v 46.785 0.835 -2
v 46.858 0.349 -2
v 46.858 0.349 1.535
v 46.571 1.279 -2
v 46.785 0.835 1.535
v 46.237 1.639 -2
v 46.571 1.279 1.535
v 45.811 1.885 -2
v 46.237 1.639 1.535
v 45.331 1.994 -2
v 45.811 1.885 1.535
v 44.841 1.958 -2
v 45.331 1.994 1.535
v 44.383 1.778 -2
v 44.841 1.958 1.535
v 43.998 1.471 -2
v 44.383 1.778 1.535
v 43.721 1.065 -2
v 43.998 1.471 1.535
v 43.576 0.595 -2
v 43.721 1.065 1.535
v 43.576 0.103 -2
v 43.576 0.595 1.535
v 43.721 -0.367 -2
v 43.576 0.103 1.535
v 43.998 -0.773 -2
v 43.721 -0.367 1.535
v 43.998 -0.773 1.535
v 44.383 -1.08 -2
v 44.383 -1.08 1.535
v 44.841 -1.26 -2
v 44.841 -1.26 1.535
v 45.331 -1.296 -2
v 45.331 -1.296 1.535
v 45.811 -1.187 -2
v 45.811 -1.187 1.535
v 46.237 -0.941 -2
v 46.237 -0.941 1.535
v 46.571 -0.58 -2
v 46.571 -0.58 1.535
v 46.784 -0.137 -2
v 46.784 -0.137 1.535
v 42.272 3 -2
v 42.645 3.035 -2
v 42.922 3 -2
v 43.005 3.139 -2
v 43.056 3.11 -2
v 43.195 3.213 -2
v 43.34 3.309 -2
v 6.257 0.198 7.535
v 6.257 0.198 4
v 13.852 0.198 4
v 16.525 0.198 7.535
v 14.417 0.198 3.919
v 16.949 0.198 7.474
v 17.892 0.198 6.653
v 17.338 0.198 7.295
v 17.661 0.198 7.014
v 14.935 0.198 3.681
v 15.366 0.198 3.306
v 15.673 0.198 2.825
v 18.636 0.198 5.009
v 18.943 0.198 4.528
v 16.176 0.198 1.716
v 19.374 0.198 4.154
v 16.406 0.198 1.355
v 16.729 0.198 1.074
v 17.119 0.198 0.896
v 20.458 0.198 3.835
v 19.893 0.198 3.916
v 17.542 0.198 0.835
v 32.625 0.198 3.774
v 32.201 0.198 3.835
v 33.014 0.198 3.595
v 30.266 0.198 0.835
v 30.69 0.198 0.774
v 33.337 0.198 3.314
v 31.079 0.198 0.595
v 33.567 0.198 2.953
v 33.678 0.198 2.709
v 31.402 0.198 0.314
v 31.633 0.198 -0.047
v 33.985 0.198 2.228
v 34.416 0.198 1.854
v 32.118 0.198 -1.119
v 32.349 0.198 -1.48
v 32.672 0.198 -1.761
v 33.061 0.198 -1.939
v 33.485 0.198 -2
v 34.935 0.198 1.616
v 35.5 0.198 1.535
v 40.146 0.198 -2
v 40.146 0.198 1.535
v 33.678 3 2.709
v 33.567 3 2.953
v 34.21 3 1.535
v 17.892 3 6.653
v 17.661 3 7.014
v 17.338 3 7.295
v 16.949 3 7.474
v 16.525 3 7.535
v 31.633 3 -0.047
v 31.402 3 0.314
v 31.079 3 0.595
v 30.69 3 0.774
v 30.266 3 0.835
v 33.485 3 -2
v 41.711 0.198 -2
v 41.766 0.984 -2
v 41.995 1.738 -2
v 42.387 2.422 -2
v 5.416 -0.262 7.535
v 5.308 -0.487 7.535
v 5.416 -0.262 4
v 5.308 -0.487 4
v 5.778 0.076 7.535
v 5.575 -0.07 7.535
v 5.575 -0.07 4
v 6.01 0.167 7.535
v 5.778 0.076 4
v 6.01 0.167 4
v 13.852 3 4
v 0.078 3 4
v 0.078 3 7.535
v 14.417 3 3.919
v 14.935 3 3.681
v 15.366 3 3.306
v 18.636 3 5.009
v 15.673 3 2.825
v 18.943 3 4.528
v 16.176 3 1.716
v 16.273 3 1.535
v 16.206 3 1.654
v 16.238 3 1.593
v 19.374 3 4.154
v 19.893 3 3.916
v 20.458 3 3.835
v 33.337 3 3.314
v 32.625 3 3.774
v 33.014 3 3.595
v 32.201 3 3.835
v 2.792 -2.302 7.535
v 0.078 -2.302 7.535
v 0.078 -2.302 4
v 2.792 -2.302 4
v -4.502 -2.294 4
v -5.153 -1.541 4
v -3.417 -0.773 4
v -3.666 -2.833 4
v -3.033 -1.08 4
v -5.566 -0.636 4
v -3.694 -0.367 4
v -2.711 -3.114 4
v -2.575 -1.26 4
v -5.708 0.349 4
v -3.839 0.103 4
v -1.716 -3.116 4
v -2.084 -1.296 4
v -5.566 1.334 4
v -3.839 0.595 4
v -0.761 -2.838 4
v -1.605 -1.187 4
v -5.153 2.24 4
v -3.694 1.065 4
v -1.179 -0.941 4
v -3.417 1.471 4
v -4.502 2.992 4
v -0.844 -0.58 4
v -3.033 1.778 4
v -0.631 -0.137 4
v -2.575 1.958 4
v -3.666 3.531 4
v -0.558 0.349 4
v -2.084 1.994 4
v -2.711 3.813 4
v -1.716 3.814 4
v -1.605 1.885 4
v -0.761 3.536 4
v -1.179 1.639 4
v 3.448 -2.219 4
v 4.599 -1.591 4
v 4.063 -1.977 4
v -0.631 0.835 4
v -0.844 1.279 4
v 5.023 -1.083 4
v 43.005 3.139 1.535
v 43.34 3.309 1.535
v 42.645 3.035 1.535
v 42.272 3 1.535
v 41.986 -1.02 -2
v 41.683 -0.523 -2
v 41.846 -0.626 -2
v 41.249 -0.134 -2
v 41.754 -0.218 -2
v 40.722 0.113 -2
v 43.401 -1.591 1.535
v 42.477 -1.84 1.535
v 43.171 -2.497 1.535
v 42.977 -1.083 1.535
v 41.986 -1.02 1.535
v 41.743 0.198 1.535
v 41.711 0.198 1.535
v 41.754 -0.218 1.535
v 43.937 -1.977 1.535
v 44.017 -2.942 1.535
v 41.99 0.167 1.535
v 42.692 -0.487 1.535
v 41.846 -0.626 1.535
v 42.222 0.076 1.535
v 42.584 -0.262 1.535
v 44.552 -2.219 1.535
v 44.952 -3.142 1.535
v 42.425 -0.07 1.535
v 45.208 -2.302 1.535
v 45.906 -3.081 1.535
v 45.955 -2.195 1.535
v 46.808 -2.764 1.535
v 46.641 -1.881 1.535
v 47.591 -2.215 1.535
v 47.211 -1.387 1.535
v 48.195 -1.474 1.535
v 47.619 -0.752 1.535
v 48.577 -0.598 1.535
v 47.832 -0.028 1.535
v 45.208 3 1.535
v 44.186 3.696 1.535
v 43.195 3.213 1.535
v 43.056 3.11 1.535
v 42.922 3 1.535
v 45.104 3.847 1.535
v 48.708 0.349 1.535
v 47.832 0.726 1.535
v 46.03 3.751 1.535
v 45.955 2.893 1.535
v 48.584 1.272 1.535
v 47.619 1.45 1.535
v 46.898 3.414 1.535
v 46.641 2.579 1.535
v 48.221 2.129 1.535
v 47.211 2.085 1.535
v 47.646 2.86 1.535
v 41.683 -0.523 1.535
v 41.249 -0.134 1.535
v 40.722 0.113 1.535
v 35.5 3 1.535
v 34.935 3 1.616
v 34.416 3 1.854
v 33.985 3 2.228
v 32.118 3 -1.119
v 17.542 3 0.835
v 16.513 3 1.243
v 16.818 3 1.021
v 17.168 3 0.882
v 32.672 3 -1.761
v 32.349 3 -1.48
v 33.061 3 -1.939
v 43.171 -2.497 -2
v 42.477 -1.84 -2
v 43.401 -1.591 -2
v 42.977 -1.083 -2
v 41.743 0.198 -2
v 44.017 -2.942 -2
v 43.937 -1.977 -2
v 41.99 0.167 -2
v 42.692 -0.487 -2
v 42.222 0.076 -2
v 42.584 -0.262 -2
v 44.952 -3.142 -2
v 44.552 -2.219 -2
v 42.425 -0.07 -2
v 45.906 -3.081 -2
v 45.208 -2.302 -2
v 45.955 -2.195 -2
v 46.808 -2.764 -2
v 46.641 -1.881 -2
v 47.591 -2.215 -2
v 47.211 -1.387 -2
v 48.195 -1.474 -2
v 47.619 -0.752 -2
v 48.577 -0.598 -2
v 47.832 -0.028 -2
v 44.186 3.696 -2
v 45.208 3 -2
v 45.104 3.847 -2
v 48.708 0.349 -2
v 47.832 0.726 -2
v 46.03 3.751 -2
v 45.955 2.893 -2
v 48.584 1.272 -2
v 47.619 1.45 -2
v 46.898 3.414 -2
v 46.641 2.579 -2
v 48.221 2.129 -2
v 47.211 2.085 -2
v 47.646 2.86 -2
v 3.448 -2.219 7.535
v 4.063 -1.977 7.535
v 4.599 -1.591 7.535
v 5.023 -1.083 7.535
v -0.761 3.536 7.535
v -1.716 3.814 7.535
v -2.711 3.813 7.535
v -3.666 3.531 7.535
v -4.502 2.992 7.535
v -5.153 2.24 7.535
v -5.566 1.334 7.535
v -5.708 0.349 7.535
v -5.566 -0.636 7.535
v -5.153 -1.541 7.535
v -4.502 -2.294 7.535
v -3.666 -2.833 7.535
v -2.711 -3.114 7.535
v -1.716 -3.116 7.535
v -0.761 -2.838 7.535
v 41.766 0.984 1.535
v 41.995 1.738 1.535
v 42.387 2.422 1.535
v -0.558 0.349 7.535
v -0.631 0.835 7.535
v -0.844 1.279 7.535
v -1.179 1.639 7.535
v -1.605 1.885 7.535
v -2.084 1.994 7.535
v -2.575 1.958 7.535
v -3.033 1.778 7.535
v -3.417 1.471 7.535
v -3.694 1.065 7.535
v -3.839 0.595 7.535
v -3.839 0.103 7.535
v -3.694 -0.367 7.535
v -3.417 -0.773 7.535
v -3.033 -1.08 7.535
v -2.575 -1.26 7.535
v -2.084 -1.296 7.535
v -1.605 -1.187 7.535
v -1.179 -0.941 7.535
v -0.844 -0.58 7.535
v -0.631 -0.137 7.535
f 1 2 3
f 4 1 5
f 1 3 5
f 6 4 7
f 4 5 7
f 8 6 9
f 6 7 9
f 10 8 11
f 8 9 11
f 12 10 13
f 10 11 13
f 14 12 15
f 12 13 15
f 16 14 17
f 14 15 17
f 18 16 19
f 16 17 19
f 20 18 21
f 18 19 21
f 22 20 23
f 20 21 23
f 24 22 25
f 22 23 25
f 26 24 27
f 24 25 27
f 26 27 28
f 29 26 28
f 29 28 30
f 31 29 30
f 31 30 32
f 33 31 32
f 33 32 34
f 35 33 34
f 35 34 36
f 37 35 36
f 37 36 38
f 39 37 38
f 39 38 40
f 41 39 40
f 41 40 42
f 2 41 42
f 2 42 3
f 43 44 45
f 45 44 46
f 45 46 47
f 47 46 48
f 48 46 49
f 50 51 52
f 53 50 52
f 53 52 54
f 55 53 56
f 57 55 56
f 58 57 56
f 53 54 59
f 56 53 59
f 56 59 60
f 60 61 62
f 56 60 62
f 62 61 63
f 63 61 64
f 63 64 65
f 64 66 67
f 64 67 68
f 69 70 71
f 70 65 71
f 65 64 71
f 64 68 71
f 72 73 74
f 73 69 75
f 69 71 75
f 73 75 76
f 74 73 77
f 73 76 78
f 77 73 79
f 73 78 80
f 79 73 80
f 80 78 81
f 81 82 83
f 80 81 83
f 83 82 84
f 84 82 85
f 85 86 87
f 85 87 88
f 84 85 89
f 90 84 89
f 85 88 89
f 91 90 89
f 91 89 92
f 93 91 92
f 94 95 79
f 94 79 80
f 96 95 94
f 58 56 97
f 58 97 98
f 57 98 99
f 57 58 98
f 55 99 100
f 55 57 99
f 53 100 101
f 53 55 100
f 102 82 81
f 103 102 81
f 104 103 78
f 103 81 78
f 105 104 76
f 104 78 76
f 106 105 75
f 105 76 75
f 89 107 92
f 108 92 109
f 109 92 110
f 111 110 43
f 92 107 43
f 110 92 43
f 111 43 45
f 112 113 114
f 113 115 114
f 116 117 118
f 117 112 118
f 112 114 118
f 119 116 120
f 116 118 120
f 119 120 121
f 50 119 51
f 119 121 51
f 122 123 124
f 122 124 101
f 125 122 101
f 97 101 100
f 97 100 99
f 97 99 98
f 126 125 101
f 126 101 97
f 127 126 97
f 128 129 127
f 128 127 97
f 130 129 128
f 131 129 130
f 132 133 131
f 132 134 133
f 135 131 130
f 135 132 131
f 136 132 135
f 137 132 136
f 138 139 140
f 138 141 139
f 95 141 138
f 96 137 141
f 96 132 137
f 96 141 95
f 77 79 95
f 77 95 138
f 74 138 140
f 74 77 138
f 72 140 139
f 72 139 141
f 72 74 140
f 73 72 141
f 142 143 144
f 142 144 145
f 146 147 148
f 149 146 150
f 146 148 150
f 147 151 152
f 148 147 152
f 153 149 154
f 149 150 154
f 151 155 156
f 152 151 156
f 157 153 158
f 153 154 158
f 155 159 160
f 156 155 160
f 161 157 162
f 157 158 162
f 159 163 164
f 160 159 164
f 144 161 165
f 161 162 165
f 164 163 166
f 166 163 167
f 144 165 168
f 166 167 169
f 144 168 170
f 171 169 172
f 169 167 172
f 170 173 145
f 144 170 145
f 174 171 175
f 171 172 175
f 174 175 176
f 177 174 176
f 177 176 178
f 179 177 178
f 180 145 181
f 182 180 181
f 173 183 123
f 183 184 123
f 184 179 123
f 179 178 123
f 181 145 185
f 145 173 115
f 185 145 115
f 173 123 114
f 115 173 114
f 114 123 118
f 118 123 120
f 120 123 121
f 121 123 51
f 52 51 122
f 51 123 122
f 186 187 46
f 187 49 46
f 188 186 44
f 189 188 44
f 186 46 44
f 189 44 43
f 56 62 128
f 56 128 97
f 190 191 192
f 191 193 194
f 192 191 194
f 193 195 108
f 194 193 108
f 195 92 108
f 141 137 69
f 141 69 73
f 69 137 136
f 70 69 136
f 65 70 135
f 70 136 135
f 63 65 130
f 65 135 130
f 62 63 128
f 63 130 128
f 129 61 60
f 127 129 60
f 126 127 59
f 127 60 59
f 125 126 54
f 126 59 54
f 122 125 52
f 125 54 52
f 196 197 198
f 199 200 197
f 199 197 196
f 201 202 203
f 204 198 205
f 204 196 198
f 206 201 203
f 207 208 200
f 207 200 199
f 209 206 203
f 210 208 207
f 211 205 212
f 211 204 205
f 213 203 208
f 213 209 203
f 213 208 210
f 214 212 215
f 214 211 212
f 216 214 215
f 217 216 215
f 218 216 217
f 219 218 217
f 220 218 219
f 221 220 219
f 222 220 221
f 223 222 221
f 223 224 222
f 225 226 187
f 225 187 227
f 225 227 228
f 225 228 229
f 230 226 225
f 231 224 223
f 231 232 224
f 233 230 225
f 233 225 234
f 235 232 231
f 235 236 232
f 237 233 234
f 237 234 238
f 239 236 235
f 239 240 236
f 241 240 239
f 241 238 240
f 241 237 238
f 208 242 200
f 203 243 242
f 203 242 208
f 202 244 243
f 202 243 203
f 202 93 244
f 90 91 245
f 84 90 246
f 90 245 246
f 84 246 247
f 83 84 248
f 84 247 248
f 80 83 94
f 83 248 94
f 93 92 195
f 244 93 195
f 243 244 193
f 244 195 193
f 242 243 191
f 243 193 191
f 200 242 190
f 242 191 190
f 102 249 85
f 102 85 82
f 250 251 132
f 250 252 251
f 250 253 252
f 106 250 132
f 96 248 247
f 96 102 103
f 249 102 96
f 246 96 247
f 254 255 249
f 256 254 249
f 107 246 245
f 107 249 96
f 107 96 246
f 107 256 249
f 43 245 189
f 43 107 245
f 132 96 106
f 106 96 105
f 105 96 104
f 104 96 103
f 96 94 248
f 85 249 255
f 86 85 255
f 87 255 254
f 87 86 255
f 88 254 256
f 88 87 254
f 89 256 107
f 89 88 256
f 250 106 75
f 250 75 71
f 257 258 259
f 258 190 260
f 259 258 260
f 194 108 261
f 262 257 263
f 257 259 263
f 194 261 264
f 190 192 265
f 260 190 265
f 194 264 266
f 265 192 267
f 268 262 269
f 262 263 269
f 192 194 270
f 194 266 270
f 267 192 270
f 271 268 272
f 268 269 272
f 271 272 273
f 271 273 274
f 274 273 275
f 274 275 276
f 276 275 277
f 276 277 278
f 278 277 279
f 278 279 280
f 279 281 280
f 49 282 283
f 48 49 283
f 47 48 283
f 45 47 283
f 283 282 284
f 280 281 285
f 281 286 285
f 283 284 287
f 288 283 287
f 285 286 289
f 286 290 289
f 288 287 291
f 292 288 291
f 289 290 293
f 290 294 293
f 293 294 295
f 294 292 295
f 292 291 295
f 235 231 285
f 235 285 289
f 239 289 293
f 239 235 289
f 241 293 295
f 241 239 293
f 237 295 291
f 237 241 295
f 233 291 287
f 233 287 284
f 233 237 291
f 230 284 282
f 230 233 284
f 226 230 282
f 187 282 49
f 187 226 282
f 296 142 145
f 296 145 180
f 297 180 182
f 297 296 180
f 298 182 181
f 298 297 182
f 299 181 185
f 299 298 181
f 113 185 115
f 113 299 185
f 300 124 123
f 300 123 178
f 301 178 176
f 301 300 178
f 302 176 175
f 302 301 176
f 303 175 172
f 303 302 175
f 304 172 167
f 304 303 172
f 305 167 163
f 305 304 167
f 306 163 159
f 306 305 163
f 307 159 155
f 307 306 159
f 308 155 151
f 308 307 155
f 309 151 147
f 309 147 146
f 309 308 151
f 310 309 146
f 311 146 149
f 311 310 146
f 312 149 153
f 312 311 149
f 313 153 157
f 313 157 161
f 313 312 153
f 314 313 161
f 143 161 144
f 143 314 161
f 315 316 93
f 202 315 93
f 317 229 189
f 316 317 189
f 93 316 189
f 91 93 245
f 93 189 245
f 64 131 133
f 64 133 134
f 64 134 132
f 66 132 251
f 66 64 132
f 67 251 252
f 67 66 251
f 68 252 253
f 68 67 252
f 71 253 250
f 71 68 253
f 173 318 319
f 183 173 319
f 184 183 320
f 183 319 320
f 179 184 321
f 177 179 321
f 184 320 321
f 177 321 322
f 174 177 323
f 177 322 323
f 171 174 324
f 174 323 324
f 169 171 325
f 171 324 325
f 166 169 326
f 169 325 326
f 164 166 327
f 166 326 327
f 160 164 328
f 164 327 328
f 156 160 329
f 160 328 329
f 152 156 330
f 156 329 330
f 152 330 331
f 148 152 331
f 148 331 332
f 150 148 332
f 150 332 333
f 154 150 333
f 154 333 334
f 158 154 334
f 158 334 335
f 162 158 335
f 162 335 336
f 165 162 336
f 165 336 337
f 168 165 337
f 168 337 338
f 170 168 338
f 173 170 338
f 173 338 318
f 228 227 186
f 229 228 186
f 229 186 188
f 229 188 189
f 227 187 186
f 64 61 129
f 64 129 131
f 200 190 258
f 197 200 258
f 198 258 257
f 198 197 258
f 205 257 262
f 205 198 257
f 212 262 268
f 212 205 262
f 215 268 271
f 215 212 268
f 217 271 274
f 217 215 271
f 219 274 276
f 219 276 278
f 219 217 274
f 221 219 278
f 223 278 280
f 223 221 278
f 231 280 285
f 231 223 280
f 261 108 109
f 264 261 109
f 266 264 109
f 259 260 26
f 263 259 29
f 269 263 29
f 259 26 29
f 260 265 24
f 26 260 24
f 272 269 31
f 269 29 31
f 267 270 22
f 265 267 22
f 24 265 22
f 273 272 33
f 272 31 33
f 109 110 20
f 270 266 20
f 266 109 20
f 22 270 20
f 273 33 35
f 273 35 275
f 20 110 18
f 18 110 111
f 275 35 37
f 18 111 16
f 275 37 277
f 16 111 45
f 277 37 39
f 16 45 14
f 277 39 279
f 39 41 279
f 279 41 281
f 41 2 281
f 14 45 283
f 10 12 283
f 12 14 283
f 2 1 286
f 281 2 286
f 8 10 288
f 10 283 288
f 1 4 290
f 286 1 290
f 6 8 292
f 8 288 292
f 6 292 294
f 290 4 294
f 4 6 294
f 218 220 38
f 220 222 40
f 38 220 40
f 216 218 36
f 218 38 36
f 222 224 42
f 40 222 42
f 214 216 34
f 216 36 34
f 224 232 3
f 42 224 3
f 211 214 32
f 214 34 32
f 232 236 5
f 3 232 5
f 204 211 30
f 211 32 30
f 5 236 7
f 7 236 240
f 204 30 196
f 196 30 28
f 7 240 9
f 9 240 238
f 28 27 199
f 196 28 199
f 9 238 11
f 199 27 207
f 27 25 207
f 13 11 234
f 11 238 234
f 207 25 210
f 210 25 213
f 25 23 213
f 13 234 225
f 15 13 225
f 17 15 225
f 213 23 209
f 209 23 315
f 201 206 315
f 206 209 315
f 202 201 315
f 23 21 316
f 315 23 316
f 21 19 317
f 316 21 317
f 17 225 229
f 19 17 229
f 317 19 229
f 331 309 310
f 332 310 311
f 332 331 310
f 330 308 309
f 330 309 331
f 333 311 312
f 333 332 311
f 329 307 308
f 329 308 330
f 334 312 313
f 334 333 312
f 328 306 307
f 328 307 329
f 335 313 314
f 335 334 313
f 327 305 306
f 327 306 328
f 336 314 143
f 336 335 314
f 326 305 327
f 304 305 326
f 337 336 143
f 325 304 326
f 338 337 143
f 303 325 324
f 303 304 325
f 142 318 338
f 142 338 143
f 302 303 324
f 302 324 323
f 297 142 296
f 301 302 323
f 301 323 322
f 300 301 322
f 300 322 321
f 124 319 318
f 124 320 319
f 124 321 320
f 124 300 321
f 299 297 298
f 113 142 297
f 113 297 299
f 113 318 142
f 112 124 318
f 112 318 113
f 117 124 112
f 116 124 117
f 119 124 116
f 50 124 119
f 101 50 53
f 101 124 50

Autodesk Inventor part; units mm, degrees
ref_plane "YZ Plane" through (0, 0, 0) normal (1, 0, 0) x (0, 1, 0)
ref_plane "XZ Plane" through (0, 0, 0) normal (0, 1, 0) x (-1, 0, 0)
ref_plane "XY Plane" through (0, 0, 0) normal (0, 0, 1) x (1, 0, 0)
sketch "スケッチ1" plane through (0, 0, 0) normal (0, 0, 1) x (1, 0, 0)
  circle A0 centre (0, 0) radius 1.7
  circle A1 centre (48, 0) radius 1.7
  circle A2 centre (0, 0) radius 3
  circle A3 centre (48, 0) radius 3
  line L0 (0, 3) -> (48, 3)
  line L1 (0, -3) -> (48, -3)
  dimension "d0" = 3.4
  dimension "d1" = 3.4
  dimension "d2" = 6
  dimension "d3" = 6
  dimension "d4" = 48
extrude "押し出し1" add sketch "スケッチ1" along normal mid plane 4
offset faces "サイズ1" outward -0.05 faces at (49.6945, -0.1368, 0.6667)
offset faces "サイズ2" outward -0.05 faces at (1.6945, 0.1368, -0.6667)
scale "尺度1" factors (0.8836555, 0.8836555, 0.8836555) then translate (2.7923, 0.349, -0.2327) bodies 1
sketch "スケッチ2" plane through (2.7923, -2.3019, 1.5346) normal (0, 0, 1) x (1, 0, 0)
  circle A0 centre (0, 2.651) radius 1.5464 projected
  circle A1 centre (0, 2.651) radius 1.65
  circle A2 centre (42.4155, 2.651) radius 1.5464 projected
  circle A3 centre (42.4155, 2.651) radius 1.65
  point P0 (-2.7923, 2.3019)
  dimension "d12" = 3.3
extrude "押し出し2" cut sketch "スケッチ2" against normal up to next
sketch "スケッチ3" plane through (2.7923, -2.3019, 1.5346) normal (0, 0, 1) x (1, 0, 0)
  circle A0 centre (0, 2.651) radius 1.65 projected
  circle A1 centre (42.4155, 2.651) radius 1.65 projected
  arc A2 (0, 5.3019) -> (0, 0) centre (0, 2.651) ccw projected
  line L0 (0, 0) -> (42.4155, 0) projected
  arc A3 (42.4155, 0) -> (42.4155, 5.3019) centre (42.4155, 2.651) ccw projected
  line L1 (42.4155, 5.3019) -> (0, 5.3019) projected
  point P0 (-2.7923, 2.3019)
extrude "押し出し3" add sketch "スケッチ3" along normal blind 6
sketch "スケッチ4" plane through (2.7923, 3, -2) normal (0, 1, 0) x (1, 0, 0)
  line L0 (42.4155, -9.5346) -> (45.0664, -9.5346) projected
  line L1 (45.0664, -9.5346) -> (45.0664, -3.5346)
  line L2 (45.0664, 0) -> (45.0664, -9.5346) projected
  line L3 (45.0664, -3.5346) -> (17.4176, -3.5346)
  line L4 (-2.651, 0) -> (-2.651, -6)
  line L5 (-2.651, 0) -> (-2.651, -9.5346) projected
  line L6 (-2.651, -6) -> (12.349, -6)
  line L7 (12.349, -6) -> (15.0664, 0)
  line L8 (42.4155, 0) -> (0, 0) projected
  line L9 (15.0664, 0) -> (-2.651, 0)
  line L10 (17.4176, -3.5346) -> (14.7002, -9.5346)
  line L11 (14.7002, -9.5346) -> (45.0664, -9.5346)
  line L12 (42.4155, -9.5346) -> (0, -9.5346) projected
  line L13 (0, 0) -> (42.4155, 0) projected
  point P0 (-2.7923, -2)
  dimension "d17" = 6
  dimension "d18" = 6
  dimension "d20" = 3.6
  dimension "d21" = 30
  dimension "d22" = 15
extrude "押し出し4" cut sketch "スケッチ4" against normal through all
sketch "スケッチ5" plane through (2.7923, -2.3019, 7.5346) normal (0, 0, 1) x (1, 0, 0)
  circle A0 centre (0, 2.651) radius 1.65 projected
  line L0 (0, 0) -> (14.7002, 0) projected
  arc A1 (0, 0) -> (2.6467, 2.5) centre (0, 2.651) ccw
  line L1 (2.6467, 2.5) -> (39.7688, 2.5)
  line L2 (0, 0) -> (42.4155, 0)
  line L3 (42.4155, 0) -> (15.0664, 0) projected
  arc A2 (39.7688, 2.5) -> (42.4155, 0) centre (42.4155, 2.651) ccw
  point P0 (-2.7923, 2.3019)
  dimension "d28" = 2.5
extrude "押し出し5" cut sketch "スケッチ5" against normal up to next contours A1 L1 A2 L2 L0
fillet "フィレット1" radius 1 2 edges at (42.5611, 0.1981, -0.2327) (5.4389, 0.1981, 5.7673)
sketch "スケッチ6" plane through (2.7923, -2.3019, 7.5346) normal (0, 0, 1) x (1, 0, 0)
  circle A0 centre (-5, 2.651) radius 1.65
  circle A1 centre (-5, 2.651) radius 2.651
  arc A2 (0, 5.3019) -> (2.5158, 1.8152) centre (0, 2.651) ccw projected
  circle A3 centre (0, 2.651) radius 1.65 projected
  line L0 (-5, 0) -> (0, 0)
  arc A4 (0, 5.3019) -> (2.5158, 1.8152) centre (0, 2.651) ccw projected
  line L1 (12.349, 5.3019) -> (0, 5.3019) projected
  line L2 (-5, 5.3019) -> (0, 5.3019)
  arc A5 (0, 0) -> (0, 5.3019) centre (0, 2.651) ccw
  point P0 (-2.7923, 2.3019)
  dimension "d32" = 5
extrude "押し出し6" add sketch "スケッチ6" against normal up to surface (3.5346 mm away) contours A1 A2 | L2 A2 A1 | A1 A2 L0 | A2 A5 A1 | A1 A2 | A3
fillet "フィレット2" radius 2 2 edges at (20.2099, 1.599, 1.5346) (15.1413, 1.599, 4)
sketch "スケッチ7" plane through (17.8587, 3, -2) normal (0, 1, 0) x (1, 0, 0)
  line L0 (-0.3662, -9.5346) -> (1.8191, -4.7095) projected
  line L1 (1.3095, -5.8346) -> (15.3095, -5.8346)
  line L2 (15.3095, -5.8346) -> (16.3512, -3.5346)
  line L3 (3.6409, -3.5346) -> (23.8842, -3.5346) projected
  line L4 (16.3512, -3.5346) -> (2.3512, -3.5346)
  line L5 (2.3512, -3.5346) -> (1.3095, -5.8346)
  line L6 (-0.3662, -9.5346) -> (1.8191, -4.7095) projected
  point P0 (-17.8587, -2)
  dimension "d36" = 2.3
  dimension "d37" = 14
extrude "押し出し7" add sketch "スケッチ7" against normal up to surface (2.8019 mm away)
fillet "フィレット3" radius 2 2 edges at (19.1682, 1.599, 3.8346) (34.2099, 1.599, 1.5346)
sketch "スケッチ8" plane through (17.8587, 3, -2) normal (0, 1, 0) x (1, 0, 0)
  line L0 (0, 0) -> (27.349, 0) projected
  line L1 (14.6587, 0) -> (13.3749, -2.8346)
  line L2 (13.3749, -2.8346) -> (-1.2838, -2.8346)
  line L3 (0, 0) -> (-2.1853, -4.8251) construction
  line L4 (-1.2838, -2.8346) -> (0, 0)
  line L5 (0, 0) -> (14.6587, 0)
  line L6 (2.5993, -5.8346) -> (15.3095, -5.8346) projected
  line L7 (15.3095, -5.8346) -> (15.8191, -4.7095) projected
  point P0 (-17.8587, -2)
  dimension "d41" = 3
  dimension "d42" = 3
extrude "押し出し8" cut sketch "スケッチ8" against normal through all
fillet "フィレット4" radius 1.5 5 edges at (16.5749, 1.599, 0.8346) (31.2336, 1.599, 0.8346) (32.5174, 1.599, -2) (17.4925, 1.599, 7.5346) (33.1682, 1.599, 3.8346)
sketch "スケッチ9" plane through (2.7923, -2.3019, 7.5346) normal (0, 0, 1) x (1, 0, 0)
  circle A0 centre (-5, 2.651) radius 1.65 projected
  circle A1 centre (-5, 2.651) radius 3.5
  point P0 (-2.7923, 2.3019)
  dimension "d46" = 7
extrude "押し出し9" add sketch "スケッチ9" against normal up to surface (3.5346 mm away)
sketch "スケッチ10" plane through (35.4996, 3, 1.5346) normal (0, 0, 1) x (1, 0, 0)
  circle A0 centre (9.7081, -2.651) radius 1.65 projected
  circle A1 centre (9.7081, -2.651) radius 3.5
  point P0 (-35.4996, -3)
  dimension "d49" = 7
extrude "押し出し10" add sketch "スケッチ10" against normal up to surface (3.5346 mm away)
fillet "フィレット5" radius 2 2 edges at (42.9225, 3, -0.2327) (41.711, 0.1981, -0.2327)
properties part number "HbFingerMainCouplerLink01"
